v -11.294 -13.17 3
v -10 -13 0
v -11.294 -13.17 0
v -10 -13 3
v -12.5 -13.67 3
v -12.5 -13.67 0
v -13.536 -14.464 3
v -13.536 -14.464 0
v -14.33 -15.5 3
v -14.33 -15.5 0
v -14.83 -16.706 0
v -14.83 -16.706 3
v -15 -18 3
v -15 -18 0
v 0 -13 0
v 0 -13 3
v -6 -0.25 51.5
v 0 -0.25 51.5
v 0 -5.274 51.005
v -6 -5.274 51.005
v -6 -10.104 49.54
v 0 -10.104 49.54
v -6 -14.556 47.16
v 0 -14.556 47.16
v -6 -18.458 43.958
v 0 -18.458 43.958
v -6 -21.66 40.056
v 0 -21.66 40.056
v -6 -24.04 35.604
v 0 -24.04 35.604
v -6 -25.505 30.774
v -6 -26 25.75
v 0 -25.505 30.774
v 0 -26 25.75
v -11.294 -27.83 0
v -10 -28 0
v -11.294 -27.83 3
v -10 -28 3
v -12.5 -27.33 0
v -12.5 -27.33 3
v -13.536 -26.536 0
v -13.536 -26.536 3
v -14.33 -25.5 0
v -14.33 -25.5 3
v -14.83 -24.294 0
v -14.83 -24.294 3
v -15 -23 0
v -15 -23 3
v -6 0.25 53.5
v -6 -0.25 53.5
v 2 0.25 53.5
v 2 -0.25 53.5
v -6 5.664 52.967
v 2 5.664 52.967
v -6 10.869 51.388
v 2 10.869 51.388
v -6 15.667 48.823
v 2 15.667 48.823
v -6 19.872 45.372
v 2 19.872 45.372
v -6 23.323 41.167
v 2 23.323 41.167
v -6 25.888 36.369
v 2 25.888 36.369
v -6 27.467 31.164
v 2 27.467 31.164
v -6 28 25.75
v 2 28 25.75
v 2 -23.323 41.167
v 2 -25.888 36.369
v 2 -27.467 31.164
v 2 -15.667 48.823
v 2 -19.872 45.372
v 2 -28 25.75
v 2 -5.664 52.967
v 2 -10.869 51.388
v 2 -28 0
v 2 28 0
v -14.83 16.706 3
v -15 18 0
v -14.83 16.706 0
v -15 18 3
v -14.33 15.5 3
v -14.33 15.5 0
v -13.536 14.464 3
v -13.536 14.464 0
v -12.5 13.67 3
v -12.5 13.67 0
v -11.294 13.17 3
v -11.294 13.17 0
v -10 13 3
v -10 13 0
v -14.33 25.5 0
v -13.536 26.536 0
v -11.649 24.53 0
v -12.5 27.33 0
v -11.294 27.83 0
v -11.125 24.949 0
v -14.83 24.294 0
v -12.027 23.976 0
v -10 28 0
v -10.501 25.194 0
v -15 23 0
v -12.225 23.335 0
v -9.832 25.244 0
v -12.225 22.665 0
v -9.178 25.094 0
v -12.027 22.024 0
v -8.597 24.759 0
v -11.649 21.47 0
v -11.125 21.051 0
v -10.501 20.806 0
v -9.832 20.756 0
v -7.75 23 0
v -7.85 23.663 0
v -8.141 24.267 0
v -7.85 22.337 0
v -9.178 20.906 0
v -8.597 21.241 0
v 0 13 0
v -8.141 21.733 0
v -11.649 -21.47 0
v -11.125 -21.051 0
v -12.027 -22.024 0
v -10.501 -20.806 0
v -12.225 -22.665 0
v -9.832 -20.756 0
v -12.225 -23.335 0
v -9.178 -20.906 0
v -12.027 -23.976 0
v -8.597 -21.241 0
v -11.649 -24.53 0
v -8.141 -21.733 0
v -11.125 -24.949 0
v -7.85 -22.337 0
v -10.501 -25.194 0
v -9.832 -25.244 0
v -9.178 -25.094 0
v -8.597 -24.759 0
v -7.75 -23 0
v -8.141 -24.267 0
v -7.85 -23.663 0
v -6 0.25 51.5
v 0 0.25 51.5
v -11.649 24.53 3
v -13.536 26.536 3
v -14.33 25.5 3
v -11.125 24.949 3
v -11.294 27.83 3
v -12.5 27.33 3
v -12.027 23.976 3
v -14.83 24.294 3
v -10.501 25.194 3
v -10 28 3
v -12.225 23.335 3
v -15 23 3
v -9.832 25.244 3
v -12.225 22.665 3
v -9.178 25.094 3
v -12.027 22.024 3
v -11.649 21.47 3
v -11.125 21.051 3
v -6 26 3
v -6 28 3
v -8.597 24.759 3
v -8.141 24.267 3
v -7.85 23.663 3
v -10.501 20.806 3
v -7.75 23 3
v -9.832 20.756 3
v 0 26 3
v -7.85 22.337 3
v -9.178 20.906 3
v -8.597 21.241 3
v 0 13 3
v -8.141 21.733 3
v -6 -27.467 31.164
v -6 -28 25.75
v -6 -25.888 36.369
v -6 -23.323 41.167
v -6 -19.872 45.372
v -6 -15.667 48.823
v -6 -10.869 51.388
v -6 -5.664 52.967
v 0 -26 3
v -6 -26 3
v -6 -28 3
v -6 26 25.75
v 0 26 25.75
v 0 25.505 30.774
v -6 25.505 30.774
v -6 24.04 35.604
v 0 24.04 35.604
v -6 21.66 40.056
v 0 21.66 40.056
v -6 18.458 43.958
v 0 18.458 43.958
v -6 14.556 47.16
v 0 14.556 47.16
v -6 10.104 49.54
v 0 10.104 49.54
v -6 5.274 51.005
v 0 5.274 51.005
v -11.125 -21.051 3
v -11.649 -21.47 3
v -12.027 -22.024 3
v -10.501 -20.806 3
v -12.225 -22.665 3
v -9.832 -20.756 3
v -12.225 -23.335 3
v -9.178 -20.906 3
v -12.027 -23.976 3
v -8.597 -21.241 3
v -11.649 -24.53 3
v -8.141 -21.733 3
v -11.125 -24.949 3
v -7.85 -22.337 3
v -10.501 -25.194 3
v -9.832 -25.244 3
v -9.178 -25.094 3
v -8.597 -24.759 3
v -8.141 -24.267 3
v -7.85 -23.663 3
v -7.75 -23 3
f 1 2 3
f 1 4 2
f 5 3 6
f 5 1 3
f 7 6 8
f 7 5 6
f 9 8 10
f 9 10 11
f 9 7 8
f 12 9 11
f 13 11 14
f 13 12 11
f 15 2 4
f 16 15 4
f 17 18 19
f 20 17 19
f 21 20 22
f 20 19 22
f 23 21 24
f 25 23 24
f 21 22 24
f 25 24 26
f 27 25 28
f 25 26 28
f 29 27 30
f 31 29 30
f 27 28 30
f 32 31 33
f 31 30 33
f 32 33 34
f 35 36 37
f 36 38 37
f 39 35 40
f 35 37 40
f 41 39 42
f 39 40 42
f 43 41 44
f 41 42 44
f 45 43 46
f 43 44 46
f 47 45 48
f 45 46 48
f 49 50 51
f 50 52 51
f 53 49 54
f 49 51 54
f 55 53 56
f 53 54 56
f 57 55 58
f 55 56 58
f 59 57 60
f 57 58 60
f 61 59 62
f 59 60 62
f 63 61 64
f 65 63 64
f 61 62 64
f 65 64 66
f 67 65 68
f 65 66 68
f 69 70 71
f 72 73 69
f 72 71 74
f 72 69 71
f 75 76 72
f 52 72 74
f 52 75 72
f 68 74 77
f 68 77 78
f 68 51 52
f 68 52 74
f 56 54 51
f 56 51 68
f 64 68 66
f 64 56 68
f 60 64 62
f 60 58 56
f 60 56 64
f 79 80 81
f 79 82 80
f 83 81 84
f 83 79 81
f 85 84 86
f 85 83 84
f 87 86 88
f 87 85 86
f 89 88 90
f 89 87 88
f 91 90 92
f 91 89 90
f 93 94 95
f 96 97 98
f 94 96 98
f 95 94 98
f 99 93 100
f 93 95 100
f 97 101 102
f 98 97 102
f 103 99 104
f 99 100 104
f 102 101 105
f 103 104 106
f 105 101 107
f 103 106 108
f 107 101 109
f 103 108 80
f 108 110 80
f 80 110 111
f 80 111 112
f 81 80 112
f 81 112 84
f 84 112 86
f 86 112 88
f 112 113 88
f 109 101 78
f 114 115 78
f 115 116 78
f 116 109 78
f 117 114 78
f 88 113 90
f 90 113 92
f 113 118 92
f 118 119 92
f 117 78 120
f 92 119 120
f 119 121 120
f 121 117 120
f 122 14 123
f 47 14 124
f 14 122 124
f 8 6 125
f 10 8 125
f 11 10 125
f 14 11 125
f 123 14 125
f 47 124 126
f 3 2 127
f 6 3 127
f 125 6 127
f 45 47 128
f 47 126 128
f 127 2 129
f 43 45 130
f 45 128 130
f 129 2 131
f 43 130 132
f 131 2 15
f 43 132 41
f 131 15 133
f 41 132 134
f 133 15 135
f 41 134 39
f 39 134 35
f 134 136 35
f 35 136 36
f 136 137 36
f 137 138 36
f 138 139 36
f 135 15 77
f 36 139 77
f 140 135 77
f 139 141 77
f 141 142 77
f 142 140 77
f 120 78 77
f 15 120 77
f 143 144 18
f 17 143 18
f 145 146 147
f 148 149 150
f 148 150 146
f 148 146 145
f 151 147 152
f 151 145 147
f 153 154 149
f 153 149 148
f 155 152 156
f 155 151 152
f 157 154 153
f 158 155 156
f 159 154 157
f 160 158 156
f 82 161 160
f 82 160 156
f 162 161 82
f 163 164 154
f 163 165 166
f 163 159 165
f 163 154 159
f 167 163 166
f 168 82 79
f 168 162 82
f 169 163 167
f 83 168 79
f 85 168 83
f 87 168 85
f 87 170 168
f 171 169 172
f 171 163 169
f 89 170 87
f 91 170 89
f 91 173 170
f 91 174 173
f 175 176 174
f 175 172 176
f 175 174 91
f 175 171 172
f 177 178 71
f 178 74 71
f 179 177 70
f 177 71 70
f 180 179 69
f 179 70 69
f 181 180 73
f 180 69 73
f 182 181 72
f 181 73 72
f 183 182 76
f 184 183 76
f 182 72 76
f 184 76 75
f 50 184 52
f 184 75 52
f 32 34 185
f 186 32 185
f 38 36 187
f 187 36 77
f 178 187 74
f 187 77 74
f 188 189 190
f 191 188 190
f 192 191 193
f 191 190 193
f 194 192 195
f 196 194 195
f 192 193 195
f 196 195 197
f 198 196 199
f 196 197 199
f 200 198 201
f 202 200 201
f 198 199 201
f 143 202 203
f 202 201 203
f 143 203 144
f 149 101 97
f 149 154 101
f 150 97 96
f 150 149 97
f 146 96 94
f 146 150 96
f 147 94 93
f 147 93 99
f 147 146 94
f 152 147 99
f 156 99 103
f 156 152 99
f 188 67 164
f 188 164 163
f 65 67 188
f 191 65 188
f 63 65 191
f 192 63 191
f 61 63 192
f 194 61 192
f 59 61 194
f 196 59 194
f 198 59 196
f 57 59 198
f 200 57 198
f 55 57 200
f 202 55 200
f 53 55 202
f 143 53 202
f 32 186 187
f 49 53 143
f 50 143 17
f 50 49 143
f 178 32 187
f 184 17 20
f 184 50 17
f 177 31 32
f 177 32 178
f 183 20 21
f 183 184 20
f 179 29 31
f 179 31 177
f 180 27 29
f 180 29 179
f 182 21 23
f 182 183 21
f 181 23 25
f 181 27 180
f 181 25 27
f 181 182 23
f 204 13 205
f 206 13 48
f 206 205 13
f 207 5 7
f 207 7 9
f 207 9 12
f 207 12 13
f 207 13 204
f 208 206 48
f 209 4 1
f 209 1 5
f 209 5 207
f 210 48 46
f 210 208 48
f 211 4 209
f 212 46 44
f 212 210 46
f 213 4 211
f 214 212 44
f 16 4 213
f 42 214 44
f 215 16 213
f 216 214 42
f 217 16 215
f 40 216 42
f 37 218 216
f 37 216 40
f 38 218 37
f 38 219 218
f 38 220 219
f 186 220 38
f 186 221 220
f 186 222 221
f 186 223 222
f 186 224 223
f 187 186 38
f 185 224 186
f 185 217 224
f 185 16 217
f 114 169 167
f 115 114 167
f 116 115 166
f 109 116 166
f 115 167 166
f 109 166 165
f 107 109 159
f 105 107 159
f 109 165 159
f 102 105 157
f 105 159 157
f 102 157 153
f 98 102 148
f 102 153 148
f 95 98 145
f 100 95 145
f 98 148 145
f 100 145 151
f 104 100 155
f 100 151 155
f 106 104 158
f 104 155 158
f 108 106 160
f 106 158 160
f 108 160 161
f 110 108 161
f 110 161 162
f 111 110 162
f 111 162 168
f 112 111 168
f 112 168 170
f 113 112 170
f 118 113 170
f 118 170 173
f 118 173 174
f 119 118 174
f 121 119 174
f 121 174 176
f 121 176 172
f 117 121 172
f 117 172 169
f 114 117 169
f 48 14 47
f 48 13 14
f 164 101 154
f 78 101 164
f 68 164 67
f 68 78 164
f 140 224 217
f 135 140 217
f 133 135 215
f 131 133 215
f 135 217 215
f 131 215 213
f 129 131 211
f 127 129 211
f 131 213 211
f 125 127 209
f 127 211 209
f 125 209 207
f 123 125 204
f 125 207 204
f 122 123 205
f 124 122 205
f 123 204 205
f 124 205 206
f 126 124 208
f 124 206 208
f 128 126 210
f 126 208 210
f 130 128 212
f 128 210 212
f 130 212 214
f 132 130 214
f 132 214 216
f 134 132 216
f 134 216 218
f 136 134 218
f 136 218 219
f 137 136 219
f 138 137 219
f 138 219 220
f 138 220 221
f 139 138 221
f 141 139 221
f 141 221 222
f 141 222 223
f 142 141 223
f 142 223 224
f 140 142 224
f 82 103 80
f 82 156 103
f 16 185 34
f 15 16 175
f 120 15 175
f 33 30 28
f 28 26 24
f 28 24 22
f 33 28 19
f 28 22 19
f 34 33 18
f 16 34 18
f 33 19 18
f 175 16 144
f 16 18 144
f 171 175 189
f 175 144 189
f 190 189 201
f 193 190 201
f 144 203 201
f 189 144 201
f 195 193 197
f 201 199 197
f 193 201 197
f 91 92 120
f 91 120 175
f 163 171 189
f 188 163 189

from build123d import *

# Parameters (mm, degrees)
F1_DEPTH = 2
F3_DEPTH = 6
F4_W     = 15
F4_H     = 3
F5_DEPTH = 15
F6_R     = 2.25
F7_DEPTH = 3.001
F8_R     = 5


with BuildPart() as f1:
    # F0 (on Right) → F1 (new body)
    with BuildSketch(Plane.YZ):
        with BuildLine():
            Line((-28, 25.75), (-28, 0))
            Line((-28, 0), (28, 0))
            Line((28, 0), (28, 25.75))
            ThreePointArc((28, 25.75), (19.872213, 45.372213), (0.25, 53.5))
            Line((0.25, 53.5), (-0.25, 53.5))
            ThreePointArc((-0.25, 53.5), (-19.872213, 45.372213), (-28, 25.75))
        make_face()
    extrude(amount=F1_DEPTH)

    # F2 (on face) → F3 (join)
    with BuildSketch(Plane(origin=(0, 0, 0), x_dir=(0, -1, 0), z_dir=(-1, 0, 0))):
        with BuildLine():
            ThreePointArc((0.25, 51.5), (18.458, 43.958), (26, 25.75))
            Line((26, 25.75), (26, 0))
            Line((26, 0), (28, 0))
            Line((28, 0), (28, 25.75))
            ThreePointArc((28, 25.75), (19.872213, 45.372213), (0.25, 53.5))
            Line((0.25, 53.5), (-0.25, 53.5))
            ThreePointArc((-0.25, 53.5), (-19.872213, 45.372213), (-28, 25.75))
            Line((-28, 25.75), (-28, 0))
            Line((-28, 0), (-26, 0))
            Line((-26, 0), (-26, 25.75))
            ThreePointArc((-26, 25.75), (-18.458, 43.958), (-0.25, 51.5))
            Line((-0.25, 51.5), (0.25, 51.5))
        make_face()
    extrude(amount=F3_DEPTH)

    # F4 (on face) → F5 (join)
    with BuildSketch(Plane(origin=(0, 0, 0), x_dir=(0, -1, 0), z_dir=(-1, 0, 0))):
        with Locations((-20.5, 1.5)):
            Rectangle(F4_W, F4_H)
        with Locations((20.5, 1.5)):
            Rectangle(F4_W, F4_H)
    extrude(amount=F5_DEPTH)

    # F6 (on face) → F7 (cut, through all)
    with BuildSketch(Plane.XY.offset(3)):
        with Locations((-10, 23)):
            Circle(F6_R)
        with Locations((-10, -23)):
            Circle(F6_R)
    extrude(amount=-F7_DEPTH, mode=Mode.SUBTRACT)

    # F8
    f8_edges = [f1.edges().sort_by_distance(p)[0] for p in [
        (-15, 28, 1.5),
        (-15, 13, 1.5),
        (-15, -13, 1.5),
        (-15, -28, 1.5),
    ]]
    fillet(f8_edges, radius=F8_R)


solid = f1.part
